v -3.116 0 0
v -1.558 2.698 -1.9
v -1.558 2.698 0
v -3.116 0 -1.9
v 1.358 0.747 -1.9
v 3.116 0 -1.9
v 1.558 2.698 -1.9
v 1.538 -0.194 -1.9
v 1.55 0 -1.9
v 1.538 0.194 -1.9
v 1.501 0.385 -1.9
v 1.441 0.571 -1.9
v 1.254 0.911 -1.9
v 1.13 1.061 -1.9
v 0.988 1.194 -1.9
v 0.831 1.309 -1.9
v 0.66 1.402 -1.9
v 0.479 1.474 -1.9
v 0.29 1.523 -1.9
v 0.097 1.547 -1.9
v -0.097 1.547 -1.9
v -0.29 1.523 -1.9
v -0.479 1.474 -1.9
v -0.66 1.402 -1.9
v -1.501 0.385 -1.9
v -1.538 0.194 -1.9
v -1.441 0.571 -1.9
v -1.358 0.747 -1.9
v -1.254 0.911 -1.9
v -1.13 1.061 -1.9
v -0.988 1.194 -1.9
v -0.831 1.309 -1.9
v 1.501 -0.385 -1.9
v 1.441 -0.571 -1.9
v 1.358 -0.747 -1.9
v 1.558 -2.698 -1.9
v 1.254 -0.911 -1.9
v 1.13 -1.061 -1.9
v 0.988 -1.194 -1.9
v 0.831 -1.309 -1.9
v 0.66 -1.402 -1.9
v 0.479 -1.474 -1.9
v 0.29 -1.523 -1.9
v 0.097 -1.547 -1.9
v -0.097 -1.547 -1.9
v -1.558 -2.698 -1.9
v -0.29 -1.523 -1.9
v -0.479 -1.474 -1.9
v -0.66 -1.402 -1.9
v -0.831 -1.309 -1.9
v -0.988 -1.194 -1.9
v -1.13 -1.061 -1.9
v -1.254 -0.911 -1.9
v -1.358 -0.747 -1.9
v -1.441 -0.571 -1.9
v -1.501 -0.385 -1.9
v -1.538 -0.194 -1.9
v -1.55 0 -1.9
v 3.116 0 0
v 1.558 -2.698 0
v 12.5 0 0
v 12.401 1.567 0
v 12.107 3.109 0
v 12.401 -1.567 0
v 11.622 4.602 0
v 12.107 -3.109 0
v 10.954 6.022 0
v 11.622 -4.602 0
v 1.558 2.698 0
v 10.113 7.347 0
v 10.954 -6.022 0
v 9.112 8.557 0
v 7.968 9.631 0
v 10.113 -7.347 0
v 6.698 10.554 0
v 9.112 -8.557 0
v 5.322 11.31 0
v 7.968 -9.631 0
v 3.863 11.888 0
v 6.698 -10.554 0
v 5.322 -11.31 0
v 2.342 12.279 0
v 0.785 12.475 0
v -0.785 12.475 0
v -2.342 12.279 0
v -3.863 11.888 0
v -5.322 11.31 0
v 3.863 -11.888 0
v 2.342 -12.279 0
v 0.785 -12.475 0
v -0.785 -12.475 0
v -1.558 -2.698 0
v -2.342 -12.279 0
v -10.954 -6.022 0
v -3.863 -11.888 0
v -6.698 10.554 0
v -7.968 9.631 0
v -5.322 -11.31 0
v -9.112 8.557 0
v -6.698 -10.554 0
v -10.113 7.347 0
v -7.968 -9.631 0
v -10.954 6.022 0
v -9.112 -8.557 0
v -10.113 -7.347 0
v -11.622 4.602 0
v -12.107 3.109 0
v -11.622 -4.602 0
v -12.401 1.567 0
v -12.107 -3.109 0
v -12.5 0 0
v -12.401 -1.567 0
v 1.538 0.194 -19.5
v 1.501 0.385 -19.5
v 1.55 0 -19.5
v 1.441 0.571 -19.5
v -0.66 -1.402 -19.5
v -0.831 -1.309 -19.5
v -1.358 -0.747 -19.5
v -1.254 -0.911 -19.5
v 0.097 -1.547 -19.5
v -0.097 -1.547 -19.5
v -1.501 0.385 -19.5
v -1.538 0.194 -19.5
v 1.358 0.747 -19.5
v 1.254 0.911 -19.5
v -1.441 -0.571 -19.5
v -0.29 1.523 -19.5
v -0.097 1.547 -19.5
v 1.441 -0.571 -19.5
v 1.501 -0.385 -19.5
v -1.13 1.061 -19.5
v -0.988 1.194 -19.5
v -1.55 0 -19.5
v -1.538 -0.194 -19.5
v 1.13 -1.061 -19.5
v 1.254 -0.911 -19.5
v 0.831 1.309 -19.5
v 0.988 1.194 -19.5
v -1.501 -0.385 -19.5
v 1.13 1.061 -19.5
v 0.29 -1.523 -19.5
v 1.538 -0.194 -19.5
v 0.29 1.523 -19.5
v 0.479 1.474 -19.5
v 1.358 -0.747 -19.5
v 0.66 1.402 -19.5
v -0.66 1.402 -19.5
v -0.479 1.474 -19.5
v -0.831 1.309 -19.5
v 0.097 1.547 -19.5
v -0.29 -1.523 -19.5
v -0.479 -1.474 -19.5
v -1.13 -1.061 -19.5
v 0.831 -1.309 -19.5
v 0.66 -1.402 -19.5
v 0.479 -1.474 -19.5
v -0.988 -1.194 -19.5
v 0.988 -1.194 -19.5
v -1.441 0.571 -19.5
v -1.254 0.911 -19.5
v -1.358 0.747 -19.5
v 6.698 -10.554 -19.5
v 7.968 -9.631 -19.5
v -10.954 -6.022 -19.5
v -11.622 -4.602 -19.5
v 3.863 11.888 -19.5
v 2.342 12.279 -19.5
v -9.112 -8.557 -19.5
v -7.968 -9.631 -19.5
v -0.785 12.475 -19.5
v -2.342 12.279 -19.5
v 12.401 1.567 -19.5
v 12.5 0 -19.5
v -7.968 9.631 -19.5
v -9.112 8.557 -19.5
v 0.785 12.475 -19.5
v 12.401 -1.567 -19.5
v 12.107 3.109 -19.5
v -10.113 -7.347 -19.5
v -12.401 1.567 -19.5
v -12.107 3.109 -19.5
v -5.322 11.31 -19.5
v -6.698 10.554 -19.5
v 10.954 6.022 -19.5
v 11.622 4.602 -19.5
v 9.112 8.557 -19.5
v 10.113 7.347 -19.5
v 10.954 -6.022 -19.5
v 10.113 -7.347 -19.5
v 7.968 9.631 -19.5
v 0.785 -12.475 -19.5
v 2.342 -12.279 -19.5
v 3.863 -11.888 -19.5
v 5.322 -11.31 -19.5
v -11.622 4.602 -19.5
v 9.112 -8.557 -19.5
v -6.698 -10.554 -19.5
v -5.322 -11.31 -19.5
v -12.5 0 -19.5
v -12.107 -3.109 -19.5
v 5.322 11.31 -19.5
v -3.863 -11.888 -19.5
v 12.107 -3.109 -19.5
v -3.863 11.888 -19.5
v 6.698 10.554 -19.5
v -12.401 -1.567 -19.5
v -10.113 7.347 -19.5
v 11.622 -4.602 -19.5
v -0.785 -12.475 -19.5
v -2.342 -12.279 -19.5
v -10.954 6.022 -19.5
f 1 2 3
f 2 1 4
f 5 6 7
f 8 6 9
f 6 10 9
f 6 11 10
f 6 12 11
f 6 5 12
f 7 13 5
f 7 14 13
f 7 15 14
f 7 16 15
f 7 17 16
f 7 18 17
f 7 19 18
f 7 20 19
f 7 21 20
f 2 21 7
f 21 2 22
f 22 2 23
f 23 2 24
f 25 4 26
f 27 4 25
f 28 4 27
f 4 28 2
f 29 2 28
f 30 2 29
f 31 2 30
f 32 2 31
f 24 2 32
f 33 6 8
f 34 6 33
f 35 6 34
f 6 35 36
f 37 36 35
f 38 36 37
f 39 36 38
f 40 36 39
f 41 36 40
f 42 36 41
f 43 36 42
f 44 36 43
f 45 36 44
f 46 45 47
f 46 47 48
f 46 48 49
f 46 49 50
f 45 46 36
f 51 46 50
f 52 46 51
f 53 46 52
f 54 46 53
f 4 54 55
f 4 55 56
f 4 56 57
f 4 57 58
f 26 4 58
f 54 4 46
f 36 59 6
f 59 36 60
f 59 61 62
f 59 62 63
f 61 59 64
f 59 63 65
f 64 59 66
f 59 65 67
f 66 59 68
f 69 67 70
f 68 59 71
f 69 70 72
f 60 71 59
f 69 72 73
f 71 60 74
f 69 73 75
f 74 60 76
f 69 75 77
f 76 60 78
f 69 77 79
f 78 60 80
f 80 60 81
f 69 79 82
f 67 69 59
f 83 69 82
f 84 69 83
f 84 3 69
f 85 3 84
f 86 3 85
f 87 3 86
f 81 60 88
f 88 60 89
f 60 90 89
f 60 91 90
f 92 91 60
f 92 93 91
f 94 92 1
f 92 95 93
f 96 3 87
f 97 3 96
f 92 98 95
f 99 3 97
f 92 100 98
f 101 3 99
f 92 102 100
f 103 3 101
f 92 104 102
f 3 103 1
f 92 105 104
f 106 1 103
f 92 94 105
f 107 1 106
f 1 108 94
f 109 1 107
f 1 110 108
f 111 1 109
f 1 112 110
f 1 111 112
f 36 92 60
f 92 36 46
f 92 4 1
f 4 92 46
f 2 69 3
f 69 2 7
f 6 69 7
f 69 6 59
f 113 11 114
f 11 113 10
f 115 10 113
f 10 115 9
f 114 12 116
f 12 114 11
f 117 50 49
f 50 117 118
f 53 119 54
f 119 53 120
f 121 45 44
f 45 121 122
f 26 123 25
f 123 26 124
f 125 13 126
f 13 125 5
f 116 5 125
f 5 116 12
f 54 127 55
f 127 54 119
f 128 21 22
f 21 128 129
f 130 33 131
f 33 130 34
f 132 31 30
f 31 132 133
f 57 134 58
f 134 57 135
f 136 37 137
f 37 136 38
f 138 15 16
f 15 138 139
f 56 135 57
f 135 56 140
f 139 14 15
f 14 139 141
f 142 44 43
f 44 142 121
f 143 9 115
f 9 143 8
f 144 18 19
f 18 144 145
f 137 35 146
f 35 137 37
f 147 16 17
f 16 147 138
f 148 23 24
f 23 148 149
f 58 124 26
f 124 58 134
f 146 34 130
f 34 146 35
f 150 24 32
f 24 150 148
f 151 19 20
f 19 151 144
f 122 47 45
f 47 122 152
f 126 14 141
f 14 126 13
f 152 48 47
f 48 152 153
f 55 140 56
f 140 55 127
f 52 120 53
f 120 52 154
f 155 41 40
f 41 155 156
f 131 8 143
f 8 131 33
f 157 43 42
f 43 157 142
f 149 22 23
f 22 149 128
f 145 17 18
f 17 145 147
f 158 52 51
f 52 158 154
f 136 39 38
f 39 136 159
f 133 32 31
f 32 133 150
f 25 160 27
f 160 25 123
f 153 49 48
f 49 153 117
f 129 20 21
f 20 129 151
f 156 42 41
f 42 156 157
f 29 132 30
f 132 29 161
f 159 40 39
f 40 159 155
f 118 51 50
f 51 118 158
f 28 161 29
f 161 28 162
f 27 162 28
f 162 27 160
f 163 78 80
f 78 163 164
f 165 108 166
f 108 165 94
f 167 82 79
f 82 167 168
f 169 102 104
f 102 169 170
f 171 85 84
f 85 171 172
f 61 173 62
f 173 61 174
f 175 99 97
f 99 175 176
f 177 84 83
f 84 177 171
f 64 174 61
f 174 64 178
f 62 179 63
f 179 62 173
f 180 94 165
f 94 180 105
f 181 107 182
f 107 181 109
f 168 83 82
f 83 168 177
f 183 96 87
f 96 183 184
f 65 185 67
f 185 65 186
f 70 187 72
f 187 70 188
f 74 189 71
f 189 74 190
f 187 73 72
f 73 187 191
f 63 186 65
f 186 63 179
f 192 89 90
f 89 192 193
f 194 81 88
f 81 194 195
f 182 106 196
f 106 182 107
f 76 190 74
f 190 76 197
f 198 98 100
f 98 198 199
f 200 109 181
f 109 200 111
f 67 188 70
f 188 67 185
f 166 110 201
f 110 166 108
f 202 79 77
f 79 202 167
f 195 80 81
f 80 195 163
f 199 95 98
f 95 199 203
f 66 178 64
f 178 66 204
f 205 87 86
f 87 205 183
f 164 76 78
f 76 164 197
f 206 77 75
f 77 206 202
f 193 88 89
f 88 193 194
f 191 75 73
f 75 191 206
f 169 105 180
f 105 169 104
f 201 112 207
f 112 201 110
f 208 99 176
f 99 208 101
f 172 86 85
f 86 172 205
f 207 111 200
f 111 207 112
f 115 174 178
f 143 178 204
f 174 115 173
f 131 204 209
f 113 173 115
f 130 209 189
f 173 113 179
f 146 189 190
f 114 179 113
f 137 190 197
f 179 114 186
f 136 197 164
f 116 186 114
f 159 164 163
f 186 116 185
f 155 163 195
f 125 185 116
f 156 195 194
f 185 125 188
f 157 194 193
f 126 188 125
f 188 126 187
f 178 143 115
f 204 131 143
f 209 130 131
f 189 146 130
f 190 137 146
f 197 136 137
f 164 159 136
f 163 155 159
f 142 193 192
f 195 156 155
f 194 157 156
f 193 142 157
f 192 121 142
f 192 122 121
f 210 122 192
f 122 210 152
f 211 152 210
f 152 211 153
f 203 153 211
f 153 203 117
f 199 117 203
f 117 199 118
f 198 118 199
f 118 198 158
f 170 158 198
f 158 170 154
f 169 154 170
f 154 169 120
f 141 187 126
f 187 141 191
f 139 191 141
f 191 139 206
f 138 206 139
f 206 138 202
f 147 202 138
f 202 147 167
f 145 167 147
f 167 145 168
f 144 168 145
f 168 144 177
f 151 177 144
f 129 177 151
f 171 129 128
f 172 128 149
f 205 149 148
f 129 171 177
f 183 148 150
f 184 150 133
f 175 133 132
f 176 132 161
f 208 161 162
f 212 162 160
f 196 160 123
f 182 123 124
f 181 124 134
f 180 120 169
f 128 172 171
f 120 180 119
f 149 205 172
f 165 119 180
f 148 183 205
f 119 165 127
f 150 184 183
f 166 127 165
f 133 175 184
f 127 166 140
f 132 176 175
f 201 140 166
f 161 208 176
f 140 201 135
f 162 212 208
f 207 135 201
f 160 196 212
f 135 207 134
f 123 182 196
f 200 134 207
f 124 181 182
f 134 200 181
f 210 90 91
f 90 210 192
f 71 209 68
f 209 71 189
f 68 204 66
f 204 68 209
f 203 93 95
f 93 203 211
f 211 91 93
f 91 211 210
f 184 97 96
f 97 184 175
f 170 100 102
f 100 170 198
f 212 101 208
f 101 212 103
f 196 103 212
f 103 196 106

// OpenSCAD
$fn = 50;

difference() {
	union() {
		translate(v = [0, 0, -19.5]) {
			cylinder(h = 19.5, r = 12.5);
		}
	}
	union() {
		translate(v = [0, 0, 0]) {
			rotate(a = [0, 0, 0]) {
				difference() {
					union() {
						translate(v = [0, 0, -1.9]) {
							linear_extrude(height = 1.9) {
								polygon(points = [[3.1158, 0.0], [1.5579000000000005, 2.698361953111554], [-1.5578999999999994, 2.6983619531115544], [-3.1158, 3.815754496783323e-16], [-1.5579000000000014, -2.6983619531115535], [1.557899999999998, -2.6983619531115552]]);
							}
						}
					}
					union();
				}
			}
		}
		#translate(v = [0, 0, -100.0]) {
			cylinder(h = 200, r = 1.55);
		}
	}
}
